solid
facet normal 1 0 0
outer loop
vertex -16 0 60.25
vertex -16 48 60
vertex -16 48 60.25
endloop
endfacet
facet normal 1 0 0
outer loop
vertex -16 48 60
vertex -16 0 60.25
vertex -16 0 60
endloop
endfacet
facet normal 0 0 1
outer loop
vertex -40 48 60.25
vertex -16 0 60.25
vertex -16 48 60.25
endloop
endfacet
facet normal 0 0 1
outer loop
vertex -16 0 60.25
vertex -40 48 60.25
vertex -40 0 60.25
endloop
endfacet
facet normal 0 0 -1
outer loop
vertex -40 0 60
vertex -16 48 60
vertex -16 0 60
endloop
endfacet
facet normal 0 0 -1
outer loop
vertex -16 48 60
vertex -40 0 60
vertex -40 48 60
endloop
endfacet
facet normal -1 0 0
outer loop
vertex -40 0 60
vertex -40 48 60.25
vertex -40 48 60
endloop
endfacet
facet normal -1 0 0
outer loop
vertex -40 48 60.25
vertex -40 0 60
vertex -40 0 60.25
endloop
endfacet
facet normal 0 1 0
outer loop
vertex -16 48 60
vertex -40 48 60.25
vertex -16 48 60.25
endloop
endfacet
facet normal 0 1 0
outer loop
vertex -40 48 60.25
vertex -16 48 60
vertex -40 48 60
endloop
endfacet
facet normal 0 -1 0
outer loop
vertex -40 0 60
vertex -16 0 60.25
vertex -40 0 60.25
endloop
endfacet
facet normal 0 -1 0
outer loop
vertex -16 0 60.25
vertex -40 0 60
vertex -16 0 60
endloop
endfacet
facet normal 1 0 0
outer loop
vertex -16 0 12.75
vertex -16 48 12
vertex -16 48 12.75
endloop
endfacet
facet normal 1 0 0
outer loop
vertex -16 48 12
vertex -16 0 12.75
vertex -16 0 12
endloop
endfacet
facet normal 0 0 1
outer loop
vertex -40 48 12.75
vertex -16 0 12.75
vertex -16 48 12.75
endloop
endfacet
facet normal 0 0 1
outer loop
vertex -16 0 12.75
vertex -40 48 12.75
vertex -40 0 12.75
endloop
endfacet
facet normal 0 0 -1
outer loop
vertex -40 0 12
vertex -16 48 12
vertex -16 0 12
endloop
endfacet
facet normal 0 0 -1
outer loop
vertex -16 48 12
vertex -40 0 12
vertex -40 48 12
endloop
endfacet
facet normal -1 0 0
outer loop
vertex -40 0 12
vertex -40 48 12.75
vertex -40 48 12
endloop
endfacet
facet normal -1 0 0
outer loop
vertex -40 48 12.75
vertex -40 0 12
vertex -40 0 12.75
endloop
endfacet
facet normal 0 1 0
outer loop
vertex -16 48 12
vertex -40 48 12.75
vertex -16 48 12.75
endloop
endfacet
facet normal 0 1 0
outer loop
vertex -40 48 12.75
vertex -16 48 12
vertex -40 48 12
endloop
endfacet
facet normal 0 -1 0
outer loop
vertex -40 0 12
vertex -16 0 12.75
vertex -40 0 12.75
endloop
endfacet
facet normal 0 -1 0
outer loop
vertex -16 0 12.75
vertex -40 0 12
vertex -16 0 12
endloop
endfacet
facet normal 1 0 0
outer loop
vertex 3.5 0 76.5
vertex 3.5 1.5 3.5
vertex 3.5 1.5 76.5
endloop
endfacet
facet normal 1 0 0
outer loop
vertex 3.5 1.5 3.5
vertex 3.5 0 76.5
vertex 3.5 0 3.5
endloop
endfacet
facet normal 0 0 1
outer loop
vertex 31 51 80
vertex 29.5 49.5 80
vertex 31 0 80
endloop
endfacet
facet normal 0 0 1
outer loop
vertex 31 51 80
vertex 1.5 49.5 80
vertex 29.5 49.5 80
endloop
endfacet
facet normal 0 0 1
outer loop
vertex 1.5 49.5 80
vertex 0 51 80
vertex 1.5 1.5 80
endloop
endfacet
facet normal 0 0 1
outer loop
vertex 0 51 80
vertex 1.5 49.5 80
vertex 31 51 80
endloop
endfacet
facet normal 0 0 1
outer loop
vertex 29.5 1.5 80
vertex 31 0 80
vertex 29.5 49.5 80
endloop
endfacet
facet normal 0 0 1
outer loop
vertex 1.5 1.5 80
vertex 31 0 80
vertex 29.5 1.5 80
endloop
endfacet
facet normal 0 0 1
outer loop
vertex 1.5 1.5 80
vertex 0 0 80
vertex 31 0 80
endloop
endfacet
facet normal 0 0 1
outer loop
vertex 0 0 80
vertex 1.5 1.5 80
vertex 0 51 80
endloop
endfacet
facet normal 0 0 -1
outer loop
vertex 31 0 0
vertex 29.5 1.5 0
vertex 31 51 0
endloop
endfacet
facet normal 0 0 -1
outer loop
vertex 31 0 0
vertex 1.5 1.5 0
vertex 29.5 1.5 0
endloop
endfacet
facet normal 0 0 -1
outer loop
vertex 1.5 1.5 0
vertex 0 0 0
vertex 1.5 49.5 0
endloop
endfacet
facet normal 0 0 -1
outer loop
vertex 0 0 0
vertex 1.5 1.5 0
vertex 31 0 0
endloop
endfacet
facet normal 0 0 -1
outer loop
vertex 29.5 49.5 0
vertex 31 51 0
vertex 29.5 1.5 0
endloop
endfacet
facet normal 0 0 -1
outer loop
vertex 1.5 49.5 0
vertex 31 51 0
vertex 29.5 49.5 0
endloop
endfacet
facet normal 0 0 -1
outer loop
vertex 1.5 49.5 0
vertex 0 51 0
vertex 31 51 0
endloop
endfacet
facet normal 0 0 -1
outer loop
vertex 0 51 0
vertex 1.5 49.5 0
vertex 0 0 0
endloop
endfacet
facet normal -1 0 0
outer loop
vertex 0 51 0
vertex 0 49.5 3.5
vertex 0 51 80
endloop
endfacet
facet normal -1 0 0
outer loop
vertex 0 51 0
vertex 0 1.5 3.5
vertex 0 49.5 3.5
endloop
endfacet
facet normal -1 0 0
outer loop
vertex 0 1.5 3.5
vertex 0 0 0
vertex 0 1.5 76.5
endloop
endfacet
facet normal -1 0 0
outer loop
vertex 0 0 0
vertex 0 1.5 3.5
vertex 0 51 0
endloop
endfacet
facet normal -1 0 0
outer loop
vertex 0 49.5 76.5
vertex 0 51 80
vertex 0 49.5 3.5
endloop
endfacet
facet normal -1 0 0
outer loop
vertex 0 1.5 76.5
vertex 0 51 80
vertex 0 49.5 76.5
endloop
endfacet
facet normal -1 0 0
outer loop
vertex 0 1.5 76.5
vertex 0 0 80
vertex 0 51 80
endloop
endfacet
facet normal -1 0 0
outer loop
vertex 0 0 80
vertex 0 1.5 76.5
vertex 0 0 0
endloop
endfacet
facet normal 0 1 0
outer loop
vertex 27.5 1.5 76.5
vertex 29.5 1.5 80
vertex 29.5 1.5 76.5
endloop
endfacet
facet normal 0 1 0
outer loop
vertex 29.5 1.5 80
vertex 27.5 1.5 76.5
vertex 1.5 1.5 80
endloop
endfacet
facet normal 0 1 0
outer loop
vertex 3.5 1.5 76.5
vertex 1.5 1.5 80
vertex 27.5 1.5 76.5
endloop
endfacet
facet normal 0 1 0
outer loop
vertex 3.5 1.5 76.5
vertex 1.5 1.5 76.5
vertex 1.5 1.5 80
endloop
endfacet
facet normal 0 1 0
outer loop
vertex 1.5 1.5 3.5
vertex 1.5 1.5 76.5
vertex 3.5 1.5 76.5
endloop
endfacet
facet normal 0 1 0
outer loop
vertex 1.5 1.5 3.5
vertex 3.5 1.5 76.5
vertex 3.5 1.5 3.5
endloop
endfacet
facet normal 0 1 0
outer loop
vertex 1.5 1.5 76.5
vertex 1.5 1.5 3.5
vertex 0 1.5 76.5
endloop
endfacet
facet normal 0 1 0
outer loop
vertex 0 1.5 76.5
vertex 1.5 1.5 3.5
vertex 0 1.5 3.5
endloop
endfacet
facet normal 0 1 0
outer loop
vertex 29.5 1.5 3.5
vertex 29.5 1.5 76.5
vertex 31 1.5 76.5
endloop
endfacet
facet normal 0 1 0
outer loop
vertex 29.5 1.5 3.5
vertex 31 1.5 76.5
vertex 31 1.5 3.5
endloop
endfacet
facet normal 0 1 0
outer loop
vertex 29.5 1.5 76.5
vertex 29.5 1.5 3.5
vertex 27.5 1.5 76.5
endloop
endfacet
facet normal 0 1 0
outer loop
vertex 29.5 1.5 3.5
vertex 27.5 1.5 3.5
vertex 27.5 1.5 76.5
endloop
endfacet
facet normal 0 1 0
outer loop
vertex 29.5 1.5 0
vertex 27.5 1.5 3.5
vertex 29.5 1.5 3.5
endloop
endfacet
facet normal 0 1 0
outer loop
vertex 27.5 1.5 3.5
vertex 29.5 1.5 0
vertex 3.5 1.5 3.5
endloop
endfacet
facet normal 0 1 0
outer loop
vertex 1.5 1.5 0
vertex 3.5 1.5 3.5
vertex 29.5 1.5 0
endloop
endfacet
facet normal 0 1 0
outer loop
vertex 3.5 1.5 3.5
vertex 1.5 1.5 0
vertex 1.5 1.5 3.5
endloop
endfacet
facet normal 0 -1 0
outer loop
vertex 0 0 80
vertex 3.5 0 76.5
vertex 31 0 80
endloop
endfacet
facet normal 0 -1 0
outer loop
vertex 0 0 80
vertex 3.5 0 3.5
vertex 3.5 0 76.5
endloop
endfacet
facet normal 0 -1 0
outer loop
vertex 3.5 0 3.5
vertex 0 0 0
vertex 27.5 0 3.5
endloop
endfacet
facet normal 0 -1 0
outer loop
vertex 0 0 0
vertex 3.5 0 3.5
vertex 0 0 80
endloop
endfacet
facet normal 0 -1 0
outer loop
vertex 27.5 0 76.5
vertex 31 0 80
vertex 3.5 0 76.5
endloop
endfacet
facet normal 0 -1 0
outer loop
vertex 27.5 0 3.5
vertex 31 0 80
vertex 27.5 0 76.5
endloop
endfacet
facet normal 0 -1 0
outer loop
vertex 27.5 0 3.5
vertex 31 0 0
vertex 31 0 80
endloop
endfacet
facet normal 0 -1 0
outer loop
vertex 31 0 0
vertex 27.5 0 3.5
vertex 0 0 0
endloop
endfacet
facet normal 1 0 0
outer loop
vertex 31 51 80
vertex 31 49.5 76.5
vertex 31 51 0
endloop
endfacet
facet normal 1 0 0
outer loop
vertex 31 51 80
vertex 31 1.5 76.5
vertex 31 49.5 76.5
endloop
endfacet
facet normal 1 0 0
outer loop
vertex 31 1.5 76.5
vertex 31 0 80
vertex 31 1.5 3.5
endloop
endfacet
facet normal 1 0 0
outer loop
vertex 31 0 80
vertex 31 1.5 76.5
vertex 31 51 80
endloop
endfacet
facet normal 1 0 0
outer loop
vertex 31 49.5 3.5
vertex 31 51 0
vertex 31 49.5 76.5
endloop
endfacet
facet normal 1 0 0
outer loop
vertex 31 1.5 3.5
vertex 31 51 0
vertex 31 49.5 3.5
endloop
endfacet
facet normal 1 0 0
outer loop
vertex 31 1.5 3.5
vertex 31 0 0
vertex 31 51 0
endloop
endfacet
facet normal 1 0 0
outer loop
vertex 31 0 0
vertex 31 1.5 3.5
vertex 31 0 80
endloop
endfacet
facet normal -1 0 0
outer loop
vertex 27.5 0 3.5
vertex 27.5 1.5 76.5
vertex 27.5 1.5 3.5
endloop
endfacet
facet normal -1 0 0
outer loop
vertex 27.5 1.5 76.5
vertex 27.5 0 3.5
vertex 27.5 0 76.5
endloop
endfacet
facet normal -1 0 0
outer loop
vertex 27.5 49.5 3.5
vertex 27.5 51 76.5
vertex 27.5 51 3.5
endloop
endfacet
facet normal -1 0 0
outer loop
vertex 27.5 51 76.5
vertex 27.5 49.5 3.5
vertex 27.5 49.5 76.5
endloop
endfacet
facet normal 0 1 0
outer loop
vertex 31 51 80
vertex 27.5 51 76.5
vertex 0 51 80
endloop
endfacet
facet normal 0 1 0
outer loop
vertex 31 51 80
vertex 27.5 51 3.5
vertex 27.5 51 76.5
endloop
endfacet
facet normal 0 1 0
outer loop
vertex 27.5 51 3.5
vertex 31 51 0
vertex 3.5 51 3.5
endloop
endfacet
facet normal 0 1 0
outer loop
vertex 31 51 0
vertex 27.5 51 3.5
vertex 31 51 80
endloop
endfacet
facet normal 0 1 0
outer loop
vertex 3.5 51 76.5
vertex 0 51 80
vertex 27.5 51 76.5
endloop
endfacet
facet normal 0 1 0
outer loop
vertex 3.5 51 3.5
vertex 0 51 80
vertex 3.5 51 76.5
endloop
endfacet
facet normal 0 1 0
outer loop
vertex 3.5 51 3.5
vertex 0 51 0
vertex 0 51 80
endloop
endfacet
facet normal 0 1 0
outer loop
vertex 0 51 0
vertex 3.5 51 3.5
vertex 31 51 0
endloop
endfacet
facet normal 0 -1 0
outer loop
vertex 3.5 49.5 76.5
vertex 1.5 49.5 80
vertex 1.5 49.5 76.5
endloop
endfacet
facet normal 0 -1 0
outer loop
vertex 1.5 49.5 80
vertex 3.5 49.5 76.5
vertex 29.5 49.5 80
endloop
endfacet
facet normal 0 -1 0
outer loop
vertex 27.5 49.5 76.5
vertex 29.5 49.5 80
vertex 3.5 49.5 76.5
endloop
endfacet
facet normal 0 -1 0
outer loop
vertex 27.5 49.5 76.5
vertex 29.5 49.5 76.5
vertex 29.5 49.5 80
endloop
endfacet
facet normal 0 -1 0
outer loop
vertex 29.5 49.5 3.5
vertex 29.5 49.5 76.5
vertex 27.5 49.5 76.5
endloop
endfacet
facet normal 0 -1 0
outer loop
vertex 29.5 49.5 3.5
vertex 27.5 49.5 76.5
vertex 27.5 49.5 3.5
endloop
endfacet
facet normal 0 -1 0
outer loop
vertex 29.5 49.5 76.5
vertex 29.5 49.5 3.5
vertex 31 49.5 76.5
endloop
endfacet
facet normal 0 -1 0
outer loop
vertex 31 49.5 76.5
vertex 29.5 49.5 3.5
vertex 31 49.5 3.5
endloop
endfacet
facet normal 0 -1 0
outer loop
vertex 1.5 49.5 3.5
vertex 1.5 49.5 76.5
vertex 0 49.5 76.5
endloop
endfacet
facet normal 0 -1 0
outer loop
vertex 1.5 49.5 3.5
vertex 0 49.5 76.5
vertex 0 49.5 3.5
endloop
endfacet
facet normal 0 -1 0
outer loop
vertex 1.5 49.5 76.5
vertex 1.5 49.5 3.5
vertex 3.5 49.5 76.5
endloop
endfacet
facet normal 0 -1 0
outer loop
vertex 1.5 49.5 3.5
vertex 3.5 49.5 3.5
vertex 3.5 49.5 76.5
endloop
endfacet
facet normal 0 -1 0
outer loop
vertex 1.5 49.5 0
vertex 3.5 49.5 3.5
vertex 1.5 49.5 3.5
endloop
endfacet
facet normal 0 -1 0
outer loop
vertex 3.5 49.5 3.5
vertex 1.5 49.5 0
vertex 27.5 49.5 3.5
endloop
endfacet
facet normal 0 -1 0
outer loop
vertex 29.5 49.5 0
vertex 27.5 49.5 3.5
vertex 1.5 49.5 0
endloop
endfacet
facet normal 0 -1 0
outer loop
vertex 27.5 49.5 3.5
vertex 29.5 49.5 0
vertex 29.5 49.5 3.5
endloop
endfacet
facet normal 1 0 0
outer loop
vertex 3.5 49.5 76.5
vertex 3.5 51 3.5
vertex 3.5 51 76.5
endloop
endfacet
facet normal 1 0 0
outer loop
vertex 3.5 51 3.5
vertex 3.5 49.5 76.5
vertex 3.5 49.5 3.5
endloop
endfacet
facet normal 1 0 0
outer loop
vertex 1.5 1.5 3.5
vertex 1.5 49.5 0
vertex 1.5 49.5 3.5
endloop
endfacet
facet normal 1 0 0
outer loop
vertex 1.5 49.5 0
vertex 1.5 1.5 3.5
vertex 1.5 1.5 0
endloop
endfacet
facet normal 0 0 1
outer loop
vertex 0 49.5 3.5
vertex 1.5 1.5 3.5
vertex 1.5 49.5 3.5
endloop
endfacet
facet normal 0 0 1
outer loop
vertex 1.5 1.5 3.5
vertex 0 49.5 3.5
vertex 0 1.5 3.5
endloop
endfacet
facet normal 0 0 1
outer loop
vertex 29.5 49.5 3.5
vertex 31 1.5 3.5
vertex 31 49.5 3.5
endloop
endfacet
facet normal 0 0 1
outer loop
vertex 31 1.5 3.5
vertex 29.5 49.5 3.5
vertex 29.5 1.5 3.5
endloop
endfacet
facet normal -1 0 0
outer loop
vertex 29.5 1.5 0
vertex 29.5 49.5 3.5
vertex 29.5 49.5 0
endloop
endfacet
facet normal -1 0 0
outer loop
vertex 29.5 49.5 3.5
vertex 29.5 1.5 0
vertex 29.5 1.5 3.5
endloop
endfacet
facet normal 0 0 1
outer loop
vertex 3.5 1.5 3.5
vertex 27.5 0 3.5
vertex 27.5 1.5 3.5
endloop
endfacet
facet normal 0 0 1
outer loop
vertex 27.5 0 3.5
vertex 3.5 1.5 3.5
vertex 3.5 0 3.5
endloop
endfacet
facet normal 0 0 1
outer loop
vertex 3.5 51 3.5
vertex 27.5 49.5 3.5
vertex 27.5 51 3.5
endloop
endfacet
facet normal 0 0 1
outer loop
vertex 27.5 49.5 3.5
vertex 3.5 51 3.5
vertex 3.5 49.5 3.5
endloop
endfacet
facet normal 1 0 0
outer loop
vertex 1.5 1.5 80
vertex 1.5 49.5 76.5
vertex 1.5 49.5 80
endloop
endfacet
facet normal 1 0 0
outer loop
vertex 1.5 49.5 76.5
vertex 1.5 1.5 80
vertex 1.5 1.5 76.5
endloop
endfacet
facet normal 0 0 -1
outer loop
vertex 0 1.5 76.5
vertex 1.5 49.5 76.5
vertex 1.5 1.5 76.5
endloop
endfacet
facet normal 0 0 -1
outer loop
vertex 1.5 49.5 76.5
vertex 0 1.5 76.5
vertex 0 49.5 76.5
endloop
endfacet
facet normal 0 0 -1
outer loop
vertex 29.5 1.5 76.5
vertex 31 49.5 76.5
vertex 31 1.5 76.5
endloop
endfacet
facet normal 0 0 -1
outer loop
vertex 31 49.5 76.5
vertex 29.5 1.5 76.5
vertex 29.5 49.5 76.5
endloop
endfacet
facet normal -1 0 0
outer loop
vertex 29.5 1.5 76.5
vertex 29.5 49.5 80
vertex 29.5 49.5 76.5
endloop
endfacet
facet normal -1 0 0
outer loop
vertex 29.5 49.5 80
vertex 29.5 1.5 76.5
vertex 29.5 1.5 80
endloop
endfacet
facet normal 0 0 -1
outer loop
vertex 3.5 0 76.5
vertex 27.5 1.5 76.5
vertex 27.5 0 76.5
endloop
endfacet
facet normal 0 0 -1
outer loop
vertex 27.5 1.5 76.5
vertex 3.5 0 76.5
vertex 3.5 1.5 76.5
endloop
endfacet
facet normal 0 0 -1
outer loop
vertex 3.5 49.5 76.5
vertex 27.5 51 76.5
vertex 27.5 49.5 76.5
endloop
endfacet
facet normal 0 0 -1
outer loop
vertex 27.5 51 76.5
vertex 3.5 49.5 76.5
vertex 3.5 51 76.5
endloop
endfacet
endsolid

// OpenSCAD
post_w = 3.5;
post_h = 1.5;
post_l=80;

light_l = 48;
light_w = 24;
light_th = 0.25;

bottom_l=48;
bottom_w=24;
bottom_th = .75;

top_b = post_l-post_w; // plane of top frame.

// holes
for(h=[12:12:post_l]){
    color("black"){
        translate([post_h,post_h,h]) 
            rotate([90,0,0])
                circle(d=1);
        translate([post_h,bottom_l+post_h,h]) 
    rotate([90,0,0])
    circle(d=1);
        translate([bottom_w+((2*post_w)-1),post_h,h]) 
    rotate([90,0,0])
    circle(d=1);
        translate([bottom_w+((2*post_w)-1),bottom_l+post_h,h]) 
    rotate([90,0,0])
    circle(d=1);
        }
    
}

// light mount
translate([-40,0,60]) 
    cube([light_w,light_l,light_th]);
    
// basic shelf
translate([-40,0,12]) 
    cube([bottom_w,bottom_l,bottom_th]);
    
// posts
translate([0,0,0]) 
    cube([post_w,post_h,post_l]);
translate([light_w+post_w,0,0]) 
    cube([post_w,post_h,post_l]);
translate([light_w+post_w,light_l+post_h,0]) 
    cube([post_w,post_h,post_l]);
translate([0,light_l+post_h,0])
    cube([post_w,post_h,post_l]);
    


// bottom_frame
translate([0,post_h,0]) 
    cube([post_h,light_l,post_w]);
translate([light_w+((2*post_w)-post_h),post_h,0]) 
    cube([post_h,light_l,post_w]);
translate([post_w,0,0])  
    cube([light_w,post_h,post_w]);
translate([post_w,light_l+post_h,0])  
    cube([light_w,post_h,post_w]);
// top_frame
translate([0,post_h,top_b]) 
    cube([post_h,light_l,post_w]);
translate([light_w+((2*post_w)-post_h),post_h,top_b])
   cube([post_h,light_l,post_w]);
translate([post_w,0,top_b])  
    cube([light_w,post_h,post_w]);
translate([post_w,light_l+post_h,top_b])  
    cube([light_w,post_h,post_w]);
